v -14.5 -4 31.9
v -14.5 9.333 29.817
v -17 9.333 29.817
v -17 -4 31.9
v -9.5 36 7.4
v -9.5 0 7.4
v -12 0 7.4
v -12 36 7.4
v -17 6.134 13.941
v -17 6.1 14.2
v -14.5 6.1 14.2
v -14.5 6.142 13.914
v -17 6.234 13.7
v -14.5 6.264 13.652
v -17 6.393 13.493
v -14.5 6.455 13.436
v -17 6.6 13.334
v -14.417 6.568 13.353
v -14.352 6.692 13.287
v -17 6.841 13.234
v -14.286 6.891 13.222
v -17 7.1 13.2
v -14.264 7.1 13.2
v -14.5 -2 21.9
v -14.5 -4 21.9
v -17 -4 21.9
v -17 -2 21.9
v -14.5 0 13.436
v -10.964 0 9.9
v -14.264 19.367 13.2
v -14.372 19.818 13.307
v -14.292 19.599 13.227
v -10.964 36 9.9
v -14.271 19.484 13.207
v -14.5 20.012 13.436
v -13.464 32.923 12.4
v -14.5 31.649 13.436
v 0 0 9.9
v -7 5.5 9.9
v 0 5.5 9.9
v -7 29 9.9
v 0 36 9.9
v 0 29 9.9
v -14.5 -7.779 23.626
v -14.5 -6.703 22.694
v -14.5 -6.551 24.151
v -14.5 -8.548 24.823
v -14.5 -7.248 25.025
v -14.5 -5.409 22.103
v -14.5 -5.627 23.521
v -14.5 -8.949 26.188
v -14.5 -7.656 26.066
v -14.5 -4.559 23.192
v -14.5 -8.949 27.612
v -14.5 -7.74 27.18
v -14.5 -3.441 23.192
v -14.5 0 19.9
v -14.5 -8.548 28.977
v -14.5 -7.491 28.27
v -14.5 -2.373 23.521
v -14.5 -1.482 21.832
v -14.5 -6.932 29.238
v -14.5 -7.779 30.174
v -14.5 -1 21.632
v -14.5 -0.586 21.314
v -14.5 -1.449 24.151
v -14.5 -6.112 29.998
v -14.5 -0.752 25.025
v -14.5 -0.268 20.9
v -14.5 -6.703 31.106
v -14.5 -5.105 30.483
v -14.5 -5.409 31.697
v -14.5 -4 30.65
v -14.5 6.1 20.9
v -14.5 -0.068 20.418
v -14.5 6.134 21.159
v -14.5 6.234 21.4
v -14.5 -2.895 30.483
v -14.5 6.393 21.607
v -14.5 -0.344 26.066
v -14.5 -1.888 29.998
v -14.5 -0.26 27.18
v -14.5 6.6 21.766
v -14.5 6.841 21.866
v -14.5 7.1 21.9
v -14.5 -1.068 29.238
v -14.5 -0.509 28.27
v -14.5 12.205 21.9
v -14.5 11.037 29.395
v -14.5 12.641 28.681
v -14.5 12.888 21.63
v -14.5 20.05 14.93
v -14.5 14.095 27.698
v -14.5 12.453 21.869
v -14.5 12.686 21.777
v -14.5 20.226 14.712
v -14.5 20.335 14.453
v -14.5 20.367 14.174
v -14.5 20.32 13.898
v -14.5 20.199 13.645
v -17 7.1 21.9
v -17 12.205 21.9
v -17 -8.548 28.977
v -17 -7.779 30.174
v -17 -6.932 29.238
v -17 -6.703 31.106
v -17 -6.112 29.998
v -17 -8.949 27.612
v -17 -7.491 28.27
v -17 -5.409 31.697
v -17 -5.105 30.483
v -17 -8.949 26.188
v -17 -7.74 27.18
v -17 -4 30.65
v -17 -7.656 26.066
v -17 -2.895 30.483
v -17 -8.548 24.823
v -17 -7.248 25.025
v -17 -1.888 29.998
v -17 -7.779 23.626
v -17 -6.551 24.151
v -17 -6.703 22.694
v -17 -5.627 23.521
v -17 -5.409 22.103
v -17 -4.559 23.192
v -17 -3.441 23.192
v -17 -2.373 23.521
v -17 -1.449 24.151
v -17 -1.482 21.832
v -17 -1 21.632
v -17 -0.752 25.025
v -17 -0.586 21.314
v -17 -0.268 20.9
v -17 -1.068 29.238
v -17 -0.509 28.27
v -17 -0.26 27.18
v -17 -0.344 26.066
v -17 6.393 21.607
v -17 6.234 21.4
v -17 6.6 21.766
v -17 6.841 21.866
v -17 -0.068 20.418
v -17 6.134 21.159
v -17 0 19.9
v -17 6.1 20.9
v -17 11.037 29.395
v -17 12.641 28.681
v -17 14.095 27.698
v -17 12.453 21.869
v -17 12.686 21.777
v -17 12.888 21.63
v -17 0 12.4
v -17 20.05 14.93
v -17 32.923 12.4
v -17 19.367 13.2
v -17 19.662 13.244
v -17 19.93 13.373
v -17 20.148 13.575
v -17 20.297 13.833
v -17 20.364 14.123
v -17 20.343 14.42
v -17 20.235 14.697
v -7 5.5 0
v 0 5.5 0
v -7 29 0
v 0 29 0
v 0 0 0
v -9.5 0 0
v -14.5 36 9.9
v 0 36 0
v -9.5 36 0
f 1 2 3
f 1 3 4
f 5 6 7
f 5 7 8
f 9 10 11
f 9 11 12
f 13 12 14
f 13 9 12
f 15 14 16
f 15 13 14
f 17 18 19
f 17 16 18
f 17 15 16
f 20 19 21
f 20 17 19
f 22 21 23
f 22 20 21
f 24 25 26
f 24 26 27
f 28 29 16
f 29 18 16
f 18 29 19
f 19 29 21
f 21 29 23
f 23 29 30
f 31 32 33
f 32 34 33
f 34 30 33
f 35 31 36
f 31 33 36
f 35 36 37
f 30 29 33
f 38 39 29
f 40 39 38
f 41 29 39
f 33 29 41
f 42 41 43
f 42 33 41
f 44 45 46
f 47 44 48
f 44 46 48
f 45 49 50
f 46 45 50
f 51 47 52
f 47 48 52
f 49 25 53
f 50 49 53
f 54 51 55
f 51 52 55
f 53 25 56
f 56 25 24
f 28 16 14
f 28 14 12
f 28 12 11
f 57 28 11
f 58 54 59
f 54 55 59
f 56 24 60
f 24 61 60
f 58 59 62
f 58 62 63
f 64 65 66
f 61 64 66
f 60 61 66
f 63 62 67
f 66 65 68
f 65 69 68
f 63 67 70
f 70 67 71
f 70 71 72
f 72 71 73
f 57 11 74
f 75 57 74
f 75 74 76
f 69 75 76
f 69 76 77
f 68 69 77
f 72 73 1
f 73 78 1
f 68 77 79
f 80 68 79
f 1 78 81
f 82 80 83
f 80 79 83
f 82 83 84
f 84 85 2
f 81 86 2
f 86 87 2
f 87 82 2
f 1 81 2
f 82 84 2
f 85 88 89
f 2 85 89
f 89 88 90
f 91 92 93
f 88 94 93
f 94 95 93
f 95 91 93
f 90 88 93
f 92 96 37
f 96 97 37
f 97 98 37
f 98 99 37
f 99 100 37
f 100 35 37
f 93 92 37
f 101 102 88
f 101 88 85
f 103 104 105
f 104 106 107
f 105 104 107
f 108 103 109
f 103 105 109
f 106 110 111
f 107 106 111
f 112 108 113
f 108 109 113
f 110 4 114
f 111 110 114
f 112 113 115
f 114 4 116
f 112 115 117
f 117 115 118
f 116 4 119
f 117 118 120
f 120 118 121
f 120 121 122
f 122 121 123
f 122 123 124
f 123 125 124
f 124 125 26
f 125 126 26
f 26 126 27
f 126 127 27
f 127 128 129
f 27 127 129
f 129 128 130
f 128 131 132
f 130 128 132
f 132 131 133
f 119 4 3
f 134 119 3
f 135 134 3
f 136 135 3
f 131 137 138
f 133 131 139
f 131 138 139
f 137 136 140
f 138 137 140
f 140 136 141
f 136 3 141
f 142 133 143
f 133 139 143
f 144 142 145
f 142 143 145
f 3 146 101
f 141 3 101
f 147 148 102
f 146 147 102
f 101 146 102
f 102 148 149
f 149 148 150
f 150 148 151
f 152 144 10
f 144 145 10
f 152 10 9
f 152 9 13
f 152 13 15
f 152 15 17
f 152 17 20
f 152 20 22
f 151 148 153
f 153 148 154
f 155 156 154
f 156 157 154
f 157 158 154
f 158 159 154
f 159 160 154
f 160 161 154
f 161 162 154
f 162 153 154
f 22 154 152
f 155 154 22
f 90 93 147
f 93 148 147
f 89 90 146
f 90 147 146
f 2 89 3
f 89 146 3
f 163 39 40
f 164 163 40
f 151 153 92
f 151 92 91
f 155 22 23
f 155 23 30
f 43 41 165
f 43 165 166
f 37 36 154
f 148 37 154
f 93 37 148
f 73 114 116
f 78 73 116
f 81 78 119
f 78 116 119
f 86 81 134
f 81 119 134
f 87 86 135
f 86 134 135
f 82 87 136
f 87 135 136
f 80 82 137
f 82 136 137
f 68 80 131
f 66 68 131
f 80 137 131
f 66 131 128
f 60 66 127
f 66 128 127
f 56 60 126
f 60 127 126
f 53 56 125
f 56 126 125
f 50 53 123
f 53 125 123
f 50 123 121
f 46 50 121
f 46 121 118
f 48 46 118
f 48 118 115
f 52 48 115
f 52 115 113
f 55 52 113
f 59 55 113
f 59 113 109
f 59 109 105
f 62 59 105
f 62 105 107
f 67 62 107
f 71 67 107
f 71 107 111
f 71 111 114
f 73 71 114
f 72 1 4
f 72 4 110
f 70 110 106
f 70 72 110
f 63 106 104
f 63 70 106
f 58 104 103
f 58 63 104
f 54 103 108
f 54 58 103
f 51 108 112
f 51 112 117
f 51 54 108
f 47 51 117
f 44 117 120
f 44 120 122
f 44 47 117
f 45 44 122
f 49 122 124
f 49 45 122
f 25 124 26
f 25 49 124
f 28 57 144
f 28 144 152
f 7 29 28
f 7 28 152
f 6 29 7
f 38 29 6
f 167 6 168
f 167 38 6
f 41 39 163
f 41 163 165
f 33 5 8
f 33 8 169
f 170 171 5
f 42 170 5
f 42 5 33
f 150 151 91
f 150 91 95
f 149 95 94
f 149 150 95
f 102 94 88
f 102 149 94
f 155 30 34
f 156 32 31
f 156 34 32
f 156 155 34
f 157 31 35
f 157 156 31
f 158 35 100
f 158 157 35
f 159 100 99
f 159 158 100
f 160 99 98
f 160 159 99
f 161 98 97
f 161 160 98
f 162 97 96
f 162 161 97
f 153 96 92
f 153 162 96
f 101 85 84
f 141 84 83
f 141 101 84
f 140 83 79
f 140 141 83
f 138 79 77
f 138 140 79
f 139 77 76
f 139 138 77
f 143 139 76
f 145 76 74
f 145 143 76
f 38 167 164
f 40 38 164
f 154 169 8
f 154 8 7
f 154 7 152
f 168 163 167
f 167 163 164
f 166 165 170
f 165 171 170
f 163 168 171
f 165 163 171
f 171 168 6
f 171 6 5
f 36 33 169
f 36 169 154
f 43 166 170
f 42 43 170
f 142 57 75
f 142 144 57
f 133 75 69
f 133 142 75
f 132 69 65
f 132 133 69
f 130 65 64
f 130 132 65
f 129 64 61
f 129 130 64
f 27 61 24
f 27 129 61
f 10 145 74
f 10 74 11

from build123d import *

# Parameters (mm, degrees)
SZKIC1_W                    = 9.5
SZKIC1_H                    = 36
DODANIE_WYCI_GNI_CIE1_DEPTH = 9.9
SZKIC2_W                    = 7
SZKIC2_H                    = 23.5
WYTNIJ_WYCI_GNI_CIE1_DEPTH  = 9.9
SZKIC3_R                    = 2.5
DODANIE_WYCI_GNI_CIE2_DEPTH = 7.5
WYTNIJ_WYCI_GNI_CIE2_DEPTH  = 137.5
WYTNIJ_WYCI_GNI_CIE3_DEPTH  = 137.5
ZAOKR_GLENIE1_R             = 10
ZAOKR_GLENIE2_R             = 2
SZKIC6_R                    = 3.75
WYTNIJ_WYCI_GNI_CIE4_DEPTH  = 10


with BuildPart() as part:
    # Szkic1 → Dodanie-wyciągnięcie1 (new body)
    with BuildSketch(Plane.XY):
        with Locations((-4.75, 18)):
            Rectangle(SZKIC1_W, SZKIC1_H)
    extrude(amount=DODANIE_WYCI_GNI_CIE1_DEPTH)

    # Szkic2 → Wytnij-wyciągnięcie1 (cut)
    with BuildSketch(Plane.XY.offset(9.9)):
        with Locations((-3.5, 17.25)):
            Rectangle(SZKIC2_W, SZKIC2_H)
    extrude(amount=-WYTNIJ_WYCI_GNI_CIE1_DEPTH, mode=Mode.SUBTRACT)

    # Szkic3 → Dodanie-wyciągnięcie2 (add)
    with BuildSketch(Plane.ZY.offset(9.5)):
        with BuildLine():
            Line((7.4, 36), (9.9, 36))
            Line((9.9, 36), (12.4, 32.923076923))
            Line((12.4, 32.923076923), (29.4, 12))
            Line((29.4, 12), (31.9, -4))
            ThreePointArc((31.9, -4), (26.9, -9), (21.9, -4))
            Line((21.9, -4), (21.9, 0))
            Line((21.9, 0), (12.4, 0))
            Line((12.4, 0), (7.4, 0))
            Line((7.4, 0), (7.4, 36))
        make_face()
        with Locations((26.9, -4)):
            Circle(SZKIC3_R, mode=Mode.SUBTRACT)
    extrude(amount=DODANIE_WYCI_GNI_CIE2_DEPTH)

    # Szkic4 → Wytnij-wyciągnięcie2 (cut)
    with BuildSketch(Plane(origin=(0, 36, 0), x_dir=(1, 0, 0), z_dir=(0, 1, 0))):
        Polygon((-12, -7.4), (-22.251097051, -17.651097051), (-26.525986736, -7.4), align=None)
        Polygon((-10.964466094, -9.9), (-14.5, -13.435533906), (-14.5, -34.97095788), (-2.856589665, -34.97095788), (-4.384348652, -9.9), align=None)
    extrude(amount=-WYTNIJ_WYCI_GNI_CIE2_DEPTH, mode=Mode.SUBTRACT)

    # Szkic5 → Wytnij-wyciągnięcie3 (cut)
    with BuildSketch(Plane.ZY.offset(17)):
        with BuildLine():
            Line((14.930271414, 20.050399523), (21.630271414, 12.888330558))
            ThreePointArc((21.630271414, 12.888330558), (21.830126715, 12.572412171), (21.9, 12.205173429))
            Line((21.9, 12.205173429), (21.9, 7.1))
            ThreePointArc((21.9, 7.1), (21.607106781, 6.392893219), (20.9, 6.1))
            Line((20.9, 6.1), (14.2, 6.1))
            ThreePointArc((14.2, 6.1), (13.492893219, 6.392893219), (13.2, 7.1))
            Line((13.2, 7.1), (13.2, 19.367242395))
            ThreePointArc((13.2, 19.367242395), (13.832761259, 20.29736911), (14.930271414, 20.050399523))
        make_face()
    extrude(amount=-WYTNIJ_WYCI_GNI_CIE3_DEPTH, mode=Mode.SUBTRACT)

    # Zaokrąglenie1
    zaokr_glenie1_edges = [part.edges().sort_by_distance(p)[0] for p in [
        (-15.75, 12, 29.4),
    ]]
    fillet(zaokr_glenie1_edges, radius=ZAOKR_GLENIE1_R)

    # Zaokrąglenie2
    zaokr_glenie2_edges = [part.edges().sort_by_distance(p)[0] for p in [
        (-15.75, 0, 21.9),
    ]]
    fillet(zaokr_glenie2_edges, radius=ZAOKR_GLENIE2_R)

    # Szkic6 → Wytnij-wyciągnięcie4 (cut)
    with BuildSketch(Plane.ZY.offset(17)):
        with Locations((26.9, -4)):
            Circle(SZKIC6_R)
    extrude(amount=-WYTNIJ_WYCI_GNI_CIE4_DEPTH, mode=Mode.SUBTRACT)


solid = part.part
